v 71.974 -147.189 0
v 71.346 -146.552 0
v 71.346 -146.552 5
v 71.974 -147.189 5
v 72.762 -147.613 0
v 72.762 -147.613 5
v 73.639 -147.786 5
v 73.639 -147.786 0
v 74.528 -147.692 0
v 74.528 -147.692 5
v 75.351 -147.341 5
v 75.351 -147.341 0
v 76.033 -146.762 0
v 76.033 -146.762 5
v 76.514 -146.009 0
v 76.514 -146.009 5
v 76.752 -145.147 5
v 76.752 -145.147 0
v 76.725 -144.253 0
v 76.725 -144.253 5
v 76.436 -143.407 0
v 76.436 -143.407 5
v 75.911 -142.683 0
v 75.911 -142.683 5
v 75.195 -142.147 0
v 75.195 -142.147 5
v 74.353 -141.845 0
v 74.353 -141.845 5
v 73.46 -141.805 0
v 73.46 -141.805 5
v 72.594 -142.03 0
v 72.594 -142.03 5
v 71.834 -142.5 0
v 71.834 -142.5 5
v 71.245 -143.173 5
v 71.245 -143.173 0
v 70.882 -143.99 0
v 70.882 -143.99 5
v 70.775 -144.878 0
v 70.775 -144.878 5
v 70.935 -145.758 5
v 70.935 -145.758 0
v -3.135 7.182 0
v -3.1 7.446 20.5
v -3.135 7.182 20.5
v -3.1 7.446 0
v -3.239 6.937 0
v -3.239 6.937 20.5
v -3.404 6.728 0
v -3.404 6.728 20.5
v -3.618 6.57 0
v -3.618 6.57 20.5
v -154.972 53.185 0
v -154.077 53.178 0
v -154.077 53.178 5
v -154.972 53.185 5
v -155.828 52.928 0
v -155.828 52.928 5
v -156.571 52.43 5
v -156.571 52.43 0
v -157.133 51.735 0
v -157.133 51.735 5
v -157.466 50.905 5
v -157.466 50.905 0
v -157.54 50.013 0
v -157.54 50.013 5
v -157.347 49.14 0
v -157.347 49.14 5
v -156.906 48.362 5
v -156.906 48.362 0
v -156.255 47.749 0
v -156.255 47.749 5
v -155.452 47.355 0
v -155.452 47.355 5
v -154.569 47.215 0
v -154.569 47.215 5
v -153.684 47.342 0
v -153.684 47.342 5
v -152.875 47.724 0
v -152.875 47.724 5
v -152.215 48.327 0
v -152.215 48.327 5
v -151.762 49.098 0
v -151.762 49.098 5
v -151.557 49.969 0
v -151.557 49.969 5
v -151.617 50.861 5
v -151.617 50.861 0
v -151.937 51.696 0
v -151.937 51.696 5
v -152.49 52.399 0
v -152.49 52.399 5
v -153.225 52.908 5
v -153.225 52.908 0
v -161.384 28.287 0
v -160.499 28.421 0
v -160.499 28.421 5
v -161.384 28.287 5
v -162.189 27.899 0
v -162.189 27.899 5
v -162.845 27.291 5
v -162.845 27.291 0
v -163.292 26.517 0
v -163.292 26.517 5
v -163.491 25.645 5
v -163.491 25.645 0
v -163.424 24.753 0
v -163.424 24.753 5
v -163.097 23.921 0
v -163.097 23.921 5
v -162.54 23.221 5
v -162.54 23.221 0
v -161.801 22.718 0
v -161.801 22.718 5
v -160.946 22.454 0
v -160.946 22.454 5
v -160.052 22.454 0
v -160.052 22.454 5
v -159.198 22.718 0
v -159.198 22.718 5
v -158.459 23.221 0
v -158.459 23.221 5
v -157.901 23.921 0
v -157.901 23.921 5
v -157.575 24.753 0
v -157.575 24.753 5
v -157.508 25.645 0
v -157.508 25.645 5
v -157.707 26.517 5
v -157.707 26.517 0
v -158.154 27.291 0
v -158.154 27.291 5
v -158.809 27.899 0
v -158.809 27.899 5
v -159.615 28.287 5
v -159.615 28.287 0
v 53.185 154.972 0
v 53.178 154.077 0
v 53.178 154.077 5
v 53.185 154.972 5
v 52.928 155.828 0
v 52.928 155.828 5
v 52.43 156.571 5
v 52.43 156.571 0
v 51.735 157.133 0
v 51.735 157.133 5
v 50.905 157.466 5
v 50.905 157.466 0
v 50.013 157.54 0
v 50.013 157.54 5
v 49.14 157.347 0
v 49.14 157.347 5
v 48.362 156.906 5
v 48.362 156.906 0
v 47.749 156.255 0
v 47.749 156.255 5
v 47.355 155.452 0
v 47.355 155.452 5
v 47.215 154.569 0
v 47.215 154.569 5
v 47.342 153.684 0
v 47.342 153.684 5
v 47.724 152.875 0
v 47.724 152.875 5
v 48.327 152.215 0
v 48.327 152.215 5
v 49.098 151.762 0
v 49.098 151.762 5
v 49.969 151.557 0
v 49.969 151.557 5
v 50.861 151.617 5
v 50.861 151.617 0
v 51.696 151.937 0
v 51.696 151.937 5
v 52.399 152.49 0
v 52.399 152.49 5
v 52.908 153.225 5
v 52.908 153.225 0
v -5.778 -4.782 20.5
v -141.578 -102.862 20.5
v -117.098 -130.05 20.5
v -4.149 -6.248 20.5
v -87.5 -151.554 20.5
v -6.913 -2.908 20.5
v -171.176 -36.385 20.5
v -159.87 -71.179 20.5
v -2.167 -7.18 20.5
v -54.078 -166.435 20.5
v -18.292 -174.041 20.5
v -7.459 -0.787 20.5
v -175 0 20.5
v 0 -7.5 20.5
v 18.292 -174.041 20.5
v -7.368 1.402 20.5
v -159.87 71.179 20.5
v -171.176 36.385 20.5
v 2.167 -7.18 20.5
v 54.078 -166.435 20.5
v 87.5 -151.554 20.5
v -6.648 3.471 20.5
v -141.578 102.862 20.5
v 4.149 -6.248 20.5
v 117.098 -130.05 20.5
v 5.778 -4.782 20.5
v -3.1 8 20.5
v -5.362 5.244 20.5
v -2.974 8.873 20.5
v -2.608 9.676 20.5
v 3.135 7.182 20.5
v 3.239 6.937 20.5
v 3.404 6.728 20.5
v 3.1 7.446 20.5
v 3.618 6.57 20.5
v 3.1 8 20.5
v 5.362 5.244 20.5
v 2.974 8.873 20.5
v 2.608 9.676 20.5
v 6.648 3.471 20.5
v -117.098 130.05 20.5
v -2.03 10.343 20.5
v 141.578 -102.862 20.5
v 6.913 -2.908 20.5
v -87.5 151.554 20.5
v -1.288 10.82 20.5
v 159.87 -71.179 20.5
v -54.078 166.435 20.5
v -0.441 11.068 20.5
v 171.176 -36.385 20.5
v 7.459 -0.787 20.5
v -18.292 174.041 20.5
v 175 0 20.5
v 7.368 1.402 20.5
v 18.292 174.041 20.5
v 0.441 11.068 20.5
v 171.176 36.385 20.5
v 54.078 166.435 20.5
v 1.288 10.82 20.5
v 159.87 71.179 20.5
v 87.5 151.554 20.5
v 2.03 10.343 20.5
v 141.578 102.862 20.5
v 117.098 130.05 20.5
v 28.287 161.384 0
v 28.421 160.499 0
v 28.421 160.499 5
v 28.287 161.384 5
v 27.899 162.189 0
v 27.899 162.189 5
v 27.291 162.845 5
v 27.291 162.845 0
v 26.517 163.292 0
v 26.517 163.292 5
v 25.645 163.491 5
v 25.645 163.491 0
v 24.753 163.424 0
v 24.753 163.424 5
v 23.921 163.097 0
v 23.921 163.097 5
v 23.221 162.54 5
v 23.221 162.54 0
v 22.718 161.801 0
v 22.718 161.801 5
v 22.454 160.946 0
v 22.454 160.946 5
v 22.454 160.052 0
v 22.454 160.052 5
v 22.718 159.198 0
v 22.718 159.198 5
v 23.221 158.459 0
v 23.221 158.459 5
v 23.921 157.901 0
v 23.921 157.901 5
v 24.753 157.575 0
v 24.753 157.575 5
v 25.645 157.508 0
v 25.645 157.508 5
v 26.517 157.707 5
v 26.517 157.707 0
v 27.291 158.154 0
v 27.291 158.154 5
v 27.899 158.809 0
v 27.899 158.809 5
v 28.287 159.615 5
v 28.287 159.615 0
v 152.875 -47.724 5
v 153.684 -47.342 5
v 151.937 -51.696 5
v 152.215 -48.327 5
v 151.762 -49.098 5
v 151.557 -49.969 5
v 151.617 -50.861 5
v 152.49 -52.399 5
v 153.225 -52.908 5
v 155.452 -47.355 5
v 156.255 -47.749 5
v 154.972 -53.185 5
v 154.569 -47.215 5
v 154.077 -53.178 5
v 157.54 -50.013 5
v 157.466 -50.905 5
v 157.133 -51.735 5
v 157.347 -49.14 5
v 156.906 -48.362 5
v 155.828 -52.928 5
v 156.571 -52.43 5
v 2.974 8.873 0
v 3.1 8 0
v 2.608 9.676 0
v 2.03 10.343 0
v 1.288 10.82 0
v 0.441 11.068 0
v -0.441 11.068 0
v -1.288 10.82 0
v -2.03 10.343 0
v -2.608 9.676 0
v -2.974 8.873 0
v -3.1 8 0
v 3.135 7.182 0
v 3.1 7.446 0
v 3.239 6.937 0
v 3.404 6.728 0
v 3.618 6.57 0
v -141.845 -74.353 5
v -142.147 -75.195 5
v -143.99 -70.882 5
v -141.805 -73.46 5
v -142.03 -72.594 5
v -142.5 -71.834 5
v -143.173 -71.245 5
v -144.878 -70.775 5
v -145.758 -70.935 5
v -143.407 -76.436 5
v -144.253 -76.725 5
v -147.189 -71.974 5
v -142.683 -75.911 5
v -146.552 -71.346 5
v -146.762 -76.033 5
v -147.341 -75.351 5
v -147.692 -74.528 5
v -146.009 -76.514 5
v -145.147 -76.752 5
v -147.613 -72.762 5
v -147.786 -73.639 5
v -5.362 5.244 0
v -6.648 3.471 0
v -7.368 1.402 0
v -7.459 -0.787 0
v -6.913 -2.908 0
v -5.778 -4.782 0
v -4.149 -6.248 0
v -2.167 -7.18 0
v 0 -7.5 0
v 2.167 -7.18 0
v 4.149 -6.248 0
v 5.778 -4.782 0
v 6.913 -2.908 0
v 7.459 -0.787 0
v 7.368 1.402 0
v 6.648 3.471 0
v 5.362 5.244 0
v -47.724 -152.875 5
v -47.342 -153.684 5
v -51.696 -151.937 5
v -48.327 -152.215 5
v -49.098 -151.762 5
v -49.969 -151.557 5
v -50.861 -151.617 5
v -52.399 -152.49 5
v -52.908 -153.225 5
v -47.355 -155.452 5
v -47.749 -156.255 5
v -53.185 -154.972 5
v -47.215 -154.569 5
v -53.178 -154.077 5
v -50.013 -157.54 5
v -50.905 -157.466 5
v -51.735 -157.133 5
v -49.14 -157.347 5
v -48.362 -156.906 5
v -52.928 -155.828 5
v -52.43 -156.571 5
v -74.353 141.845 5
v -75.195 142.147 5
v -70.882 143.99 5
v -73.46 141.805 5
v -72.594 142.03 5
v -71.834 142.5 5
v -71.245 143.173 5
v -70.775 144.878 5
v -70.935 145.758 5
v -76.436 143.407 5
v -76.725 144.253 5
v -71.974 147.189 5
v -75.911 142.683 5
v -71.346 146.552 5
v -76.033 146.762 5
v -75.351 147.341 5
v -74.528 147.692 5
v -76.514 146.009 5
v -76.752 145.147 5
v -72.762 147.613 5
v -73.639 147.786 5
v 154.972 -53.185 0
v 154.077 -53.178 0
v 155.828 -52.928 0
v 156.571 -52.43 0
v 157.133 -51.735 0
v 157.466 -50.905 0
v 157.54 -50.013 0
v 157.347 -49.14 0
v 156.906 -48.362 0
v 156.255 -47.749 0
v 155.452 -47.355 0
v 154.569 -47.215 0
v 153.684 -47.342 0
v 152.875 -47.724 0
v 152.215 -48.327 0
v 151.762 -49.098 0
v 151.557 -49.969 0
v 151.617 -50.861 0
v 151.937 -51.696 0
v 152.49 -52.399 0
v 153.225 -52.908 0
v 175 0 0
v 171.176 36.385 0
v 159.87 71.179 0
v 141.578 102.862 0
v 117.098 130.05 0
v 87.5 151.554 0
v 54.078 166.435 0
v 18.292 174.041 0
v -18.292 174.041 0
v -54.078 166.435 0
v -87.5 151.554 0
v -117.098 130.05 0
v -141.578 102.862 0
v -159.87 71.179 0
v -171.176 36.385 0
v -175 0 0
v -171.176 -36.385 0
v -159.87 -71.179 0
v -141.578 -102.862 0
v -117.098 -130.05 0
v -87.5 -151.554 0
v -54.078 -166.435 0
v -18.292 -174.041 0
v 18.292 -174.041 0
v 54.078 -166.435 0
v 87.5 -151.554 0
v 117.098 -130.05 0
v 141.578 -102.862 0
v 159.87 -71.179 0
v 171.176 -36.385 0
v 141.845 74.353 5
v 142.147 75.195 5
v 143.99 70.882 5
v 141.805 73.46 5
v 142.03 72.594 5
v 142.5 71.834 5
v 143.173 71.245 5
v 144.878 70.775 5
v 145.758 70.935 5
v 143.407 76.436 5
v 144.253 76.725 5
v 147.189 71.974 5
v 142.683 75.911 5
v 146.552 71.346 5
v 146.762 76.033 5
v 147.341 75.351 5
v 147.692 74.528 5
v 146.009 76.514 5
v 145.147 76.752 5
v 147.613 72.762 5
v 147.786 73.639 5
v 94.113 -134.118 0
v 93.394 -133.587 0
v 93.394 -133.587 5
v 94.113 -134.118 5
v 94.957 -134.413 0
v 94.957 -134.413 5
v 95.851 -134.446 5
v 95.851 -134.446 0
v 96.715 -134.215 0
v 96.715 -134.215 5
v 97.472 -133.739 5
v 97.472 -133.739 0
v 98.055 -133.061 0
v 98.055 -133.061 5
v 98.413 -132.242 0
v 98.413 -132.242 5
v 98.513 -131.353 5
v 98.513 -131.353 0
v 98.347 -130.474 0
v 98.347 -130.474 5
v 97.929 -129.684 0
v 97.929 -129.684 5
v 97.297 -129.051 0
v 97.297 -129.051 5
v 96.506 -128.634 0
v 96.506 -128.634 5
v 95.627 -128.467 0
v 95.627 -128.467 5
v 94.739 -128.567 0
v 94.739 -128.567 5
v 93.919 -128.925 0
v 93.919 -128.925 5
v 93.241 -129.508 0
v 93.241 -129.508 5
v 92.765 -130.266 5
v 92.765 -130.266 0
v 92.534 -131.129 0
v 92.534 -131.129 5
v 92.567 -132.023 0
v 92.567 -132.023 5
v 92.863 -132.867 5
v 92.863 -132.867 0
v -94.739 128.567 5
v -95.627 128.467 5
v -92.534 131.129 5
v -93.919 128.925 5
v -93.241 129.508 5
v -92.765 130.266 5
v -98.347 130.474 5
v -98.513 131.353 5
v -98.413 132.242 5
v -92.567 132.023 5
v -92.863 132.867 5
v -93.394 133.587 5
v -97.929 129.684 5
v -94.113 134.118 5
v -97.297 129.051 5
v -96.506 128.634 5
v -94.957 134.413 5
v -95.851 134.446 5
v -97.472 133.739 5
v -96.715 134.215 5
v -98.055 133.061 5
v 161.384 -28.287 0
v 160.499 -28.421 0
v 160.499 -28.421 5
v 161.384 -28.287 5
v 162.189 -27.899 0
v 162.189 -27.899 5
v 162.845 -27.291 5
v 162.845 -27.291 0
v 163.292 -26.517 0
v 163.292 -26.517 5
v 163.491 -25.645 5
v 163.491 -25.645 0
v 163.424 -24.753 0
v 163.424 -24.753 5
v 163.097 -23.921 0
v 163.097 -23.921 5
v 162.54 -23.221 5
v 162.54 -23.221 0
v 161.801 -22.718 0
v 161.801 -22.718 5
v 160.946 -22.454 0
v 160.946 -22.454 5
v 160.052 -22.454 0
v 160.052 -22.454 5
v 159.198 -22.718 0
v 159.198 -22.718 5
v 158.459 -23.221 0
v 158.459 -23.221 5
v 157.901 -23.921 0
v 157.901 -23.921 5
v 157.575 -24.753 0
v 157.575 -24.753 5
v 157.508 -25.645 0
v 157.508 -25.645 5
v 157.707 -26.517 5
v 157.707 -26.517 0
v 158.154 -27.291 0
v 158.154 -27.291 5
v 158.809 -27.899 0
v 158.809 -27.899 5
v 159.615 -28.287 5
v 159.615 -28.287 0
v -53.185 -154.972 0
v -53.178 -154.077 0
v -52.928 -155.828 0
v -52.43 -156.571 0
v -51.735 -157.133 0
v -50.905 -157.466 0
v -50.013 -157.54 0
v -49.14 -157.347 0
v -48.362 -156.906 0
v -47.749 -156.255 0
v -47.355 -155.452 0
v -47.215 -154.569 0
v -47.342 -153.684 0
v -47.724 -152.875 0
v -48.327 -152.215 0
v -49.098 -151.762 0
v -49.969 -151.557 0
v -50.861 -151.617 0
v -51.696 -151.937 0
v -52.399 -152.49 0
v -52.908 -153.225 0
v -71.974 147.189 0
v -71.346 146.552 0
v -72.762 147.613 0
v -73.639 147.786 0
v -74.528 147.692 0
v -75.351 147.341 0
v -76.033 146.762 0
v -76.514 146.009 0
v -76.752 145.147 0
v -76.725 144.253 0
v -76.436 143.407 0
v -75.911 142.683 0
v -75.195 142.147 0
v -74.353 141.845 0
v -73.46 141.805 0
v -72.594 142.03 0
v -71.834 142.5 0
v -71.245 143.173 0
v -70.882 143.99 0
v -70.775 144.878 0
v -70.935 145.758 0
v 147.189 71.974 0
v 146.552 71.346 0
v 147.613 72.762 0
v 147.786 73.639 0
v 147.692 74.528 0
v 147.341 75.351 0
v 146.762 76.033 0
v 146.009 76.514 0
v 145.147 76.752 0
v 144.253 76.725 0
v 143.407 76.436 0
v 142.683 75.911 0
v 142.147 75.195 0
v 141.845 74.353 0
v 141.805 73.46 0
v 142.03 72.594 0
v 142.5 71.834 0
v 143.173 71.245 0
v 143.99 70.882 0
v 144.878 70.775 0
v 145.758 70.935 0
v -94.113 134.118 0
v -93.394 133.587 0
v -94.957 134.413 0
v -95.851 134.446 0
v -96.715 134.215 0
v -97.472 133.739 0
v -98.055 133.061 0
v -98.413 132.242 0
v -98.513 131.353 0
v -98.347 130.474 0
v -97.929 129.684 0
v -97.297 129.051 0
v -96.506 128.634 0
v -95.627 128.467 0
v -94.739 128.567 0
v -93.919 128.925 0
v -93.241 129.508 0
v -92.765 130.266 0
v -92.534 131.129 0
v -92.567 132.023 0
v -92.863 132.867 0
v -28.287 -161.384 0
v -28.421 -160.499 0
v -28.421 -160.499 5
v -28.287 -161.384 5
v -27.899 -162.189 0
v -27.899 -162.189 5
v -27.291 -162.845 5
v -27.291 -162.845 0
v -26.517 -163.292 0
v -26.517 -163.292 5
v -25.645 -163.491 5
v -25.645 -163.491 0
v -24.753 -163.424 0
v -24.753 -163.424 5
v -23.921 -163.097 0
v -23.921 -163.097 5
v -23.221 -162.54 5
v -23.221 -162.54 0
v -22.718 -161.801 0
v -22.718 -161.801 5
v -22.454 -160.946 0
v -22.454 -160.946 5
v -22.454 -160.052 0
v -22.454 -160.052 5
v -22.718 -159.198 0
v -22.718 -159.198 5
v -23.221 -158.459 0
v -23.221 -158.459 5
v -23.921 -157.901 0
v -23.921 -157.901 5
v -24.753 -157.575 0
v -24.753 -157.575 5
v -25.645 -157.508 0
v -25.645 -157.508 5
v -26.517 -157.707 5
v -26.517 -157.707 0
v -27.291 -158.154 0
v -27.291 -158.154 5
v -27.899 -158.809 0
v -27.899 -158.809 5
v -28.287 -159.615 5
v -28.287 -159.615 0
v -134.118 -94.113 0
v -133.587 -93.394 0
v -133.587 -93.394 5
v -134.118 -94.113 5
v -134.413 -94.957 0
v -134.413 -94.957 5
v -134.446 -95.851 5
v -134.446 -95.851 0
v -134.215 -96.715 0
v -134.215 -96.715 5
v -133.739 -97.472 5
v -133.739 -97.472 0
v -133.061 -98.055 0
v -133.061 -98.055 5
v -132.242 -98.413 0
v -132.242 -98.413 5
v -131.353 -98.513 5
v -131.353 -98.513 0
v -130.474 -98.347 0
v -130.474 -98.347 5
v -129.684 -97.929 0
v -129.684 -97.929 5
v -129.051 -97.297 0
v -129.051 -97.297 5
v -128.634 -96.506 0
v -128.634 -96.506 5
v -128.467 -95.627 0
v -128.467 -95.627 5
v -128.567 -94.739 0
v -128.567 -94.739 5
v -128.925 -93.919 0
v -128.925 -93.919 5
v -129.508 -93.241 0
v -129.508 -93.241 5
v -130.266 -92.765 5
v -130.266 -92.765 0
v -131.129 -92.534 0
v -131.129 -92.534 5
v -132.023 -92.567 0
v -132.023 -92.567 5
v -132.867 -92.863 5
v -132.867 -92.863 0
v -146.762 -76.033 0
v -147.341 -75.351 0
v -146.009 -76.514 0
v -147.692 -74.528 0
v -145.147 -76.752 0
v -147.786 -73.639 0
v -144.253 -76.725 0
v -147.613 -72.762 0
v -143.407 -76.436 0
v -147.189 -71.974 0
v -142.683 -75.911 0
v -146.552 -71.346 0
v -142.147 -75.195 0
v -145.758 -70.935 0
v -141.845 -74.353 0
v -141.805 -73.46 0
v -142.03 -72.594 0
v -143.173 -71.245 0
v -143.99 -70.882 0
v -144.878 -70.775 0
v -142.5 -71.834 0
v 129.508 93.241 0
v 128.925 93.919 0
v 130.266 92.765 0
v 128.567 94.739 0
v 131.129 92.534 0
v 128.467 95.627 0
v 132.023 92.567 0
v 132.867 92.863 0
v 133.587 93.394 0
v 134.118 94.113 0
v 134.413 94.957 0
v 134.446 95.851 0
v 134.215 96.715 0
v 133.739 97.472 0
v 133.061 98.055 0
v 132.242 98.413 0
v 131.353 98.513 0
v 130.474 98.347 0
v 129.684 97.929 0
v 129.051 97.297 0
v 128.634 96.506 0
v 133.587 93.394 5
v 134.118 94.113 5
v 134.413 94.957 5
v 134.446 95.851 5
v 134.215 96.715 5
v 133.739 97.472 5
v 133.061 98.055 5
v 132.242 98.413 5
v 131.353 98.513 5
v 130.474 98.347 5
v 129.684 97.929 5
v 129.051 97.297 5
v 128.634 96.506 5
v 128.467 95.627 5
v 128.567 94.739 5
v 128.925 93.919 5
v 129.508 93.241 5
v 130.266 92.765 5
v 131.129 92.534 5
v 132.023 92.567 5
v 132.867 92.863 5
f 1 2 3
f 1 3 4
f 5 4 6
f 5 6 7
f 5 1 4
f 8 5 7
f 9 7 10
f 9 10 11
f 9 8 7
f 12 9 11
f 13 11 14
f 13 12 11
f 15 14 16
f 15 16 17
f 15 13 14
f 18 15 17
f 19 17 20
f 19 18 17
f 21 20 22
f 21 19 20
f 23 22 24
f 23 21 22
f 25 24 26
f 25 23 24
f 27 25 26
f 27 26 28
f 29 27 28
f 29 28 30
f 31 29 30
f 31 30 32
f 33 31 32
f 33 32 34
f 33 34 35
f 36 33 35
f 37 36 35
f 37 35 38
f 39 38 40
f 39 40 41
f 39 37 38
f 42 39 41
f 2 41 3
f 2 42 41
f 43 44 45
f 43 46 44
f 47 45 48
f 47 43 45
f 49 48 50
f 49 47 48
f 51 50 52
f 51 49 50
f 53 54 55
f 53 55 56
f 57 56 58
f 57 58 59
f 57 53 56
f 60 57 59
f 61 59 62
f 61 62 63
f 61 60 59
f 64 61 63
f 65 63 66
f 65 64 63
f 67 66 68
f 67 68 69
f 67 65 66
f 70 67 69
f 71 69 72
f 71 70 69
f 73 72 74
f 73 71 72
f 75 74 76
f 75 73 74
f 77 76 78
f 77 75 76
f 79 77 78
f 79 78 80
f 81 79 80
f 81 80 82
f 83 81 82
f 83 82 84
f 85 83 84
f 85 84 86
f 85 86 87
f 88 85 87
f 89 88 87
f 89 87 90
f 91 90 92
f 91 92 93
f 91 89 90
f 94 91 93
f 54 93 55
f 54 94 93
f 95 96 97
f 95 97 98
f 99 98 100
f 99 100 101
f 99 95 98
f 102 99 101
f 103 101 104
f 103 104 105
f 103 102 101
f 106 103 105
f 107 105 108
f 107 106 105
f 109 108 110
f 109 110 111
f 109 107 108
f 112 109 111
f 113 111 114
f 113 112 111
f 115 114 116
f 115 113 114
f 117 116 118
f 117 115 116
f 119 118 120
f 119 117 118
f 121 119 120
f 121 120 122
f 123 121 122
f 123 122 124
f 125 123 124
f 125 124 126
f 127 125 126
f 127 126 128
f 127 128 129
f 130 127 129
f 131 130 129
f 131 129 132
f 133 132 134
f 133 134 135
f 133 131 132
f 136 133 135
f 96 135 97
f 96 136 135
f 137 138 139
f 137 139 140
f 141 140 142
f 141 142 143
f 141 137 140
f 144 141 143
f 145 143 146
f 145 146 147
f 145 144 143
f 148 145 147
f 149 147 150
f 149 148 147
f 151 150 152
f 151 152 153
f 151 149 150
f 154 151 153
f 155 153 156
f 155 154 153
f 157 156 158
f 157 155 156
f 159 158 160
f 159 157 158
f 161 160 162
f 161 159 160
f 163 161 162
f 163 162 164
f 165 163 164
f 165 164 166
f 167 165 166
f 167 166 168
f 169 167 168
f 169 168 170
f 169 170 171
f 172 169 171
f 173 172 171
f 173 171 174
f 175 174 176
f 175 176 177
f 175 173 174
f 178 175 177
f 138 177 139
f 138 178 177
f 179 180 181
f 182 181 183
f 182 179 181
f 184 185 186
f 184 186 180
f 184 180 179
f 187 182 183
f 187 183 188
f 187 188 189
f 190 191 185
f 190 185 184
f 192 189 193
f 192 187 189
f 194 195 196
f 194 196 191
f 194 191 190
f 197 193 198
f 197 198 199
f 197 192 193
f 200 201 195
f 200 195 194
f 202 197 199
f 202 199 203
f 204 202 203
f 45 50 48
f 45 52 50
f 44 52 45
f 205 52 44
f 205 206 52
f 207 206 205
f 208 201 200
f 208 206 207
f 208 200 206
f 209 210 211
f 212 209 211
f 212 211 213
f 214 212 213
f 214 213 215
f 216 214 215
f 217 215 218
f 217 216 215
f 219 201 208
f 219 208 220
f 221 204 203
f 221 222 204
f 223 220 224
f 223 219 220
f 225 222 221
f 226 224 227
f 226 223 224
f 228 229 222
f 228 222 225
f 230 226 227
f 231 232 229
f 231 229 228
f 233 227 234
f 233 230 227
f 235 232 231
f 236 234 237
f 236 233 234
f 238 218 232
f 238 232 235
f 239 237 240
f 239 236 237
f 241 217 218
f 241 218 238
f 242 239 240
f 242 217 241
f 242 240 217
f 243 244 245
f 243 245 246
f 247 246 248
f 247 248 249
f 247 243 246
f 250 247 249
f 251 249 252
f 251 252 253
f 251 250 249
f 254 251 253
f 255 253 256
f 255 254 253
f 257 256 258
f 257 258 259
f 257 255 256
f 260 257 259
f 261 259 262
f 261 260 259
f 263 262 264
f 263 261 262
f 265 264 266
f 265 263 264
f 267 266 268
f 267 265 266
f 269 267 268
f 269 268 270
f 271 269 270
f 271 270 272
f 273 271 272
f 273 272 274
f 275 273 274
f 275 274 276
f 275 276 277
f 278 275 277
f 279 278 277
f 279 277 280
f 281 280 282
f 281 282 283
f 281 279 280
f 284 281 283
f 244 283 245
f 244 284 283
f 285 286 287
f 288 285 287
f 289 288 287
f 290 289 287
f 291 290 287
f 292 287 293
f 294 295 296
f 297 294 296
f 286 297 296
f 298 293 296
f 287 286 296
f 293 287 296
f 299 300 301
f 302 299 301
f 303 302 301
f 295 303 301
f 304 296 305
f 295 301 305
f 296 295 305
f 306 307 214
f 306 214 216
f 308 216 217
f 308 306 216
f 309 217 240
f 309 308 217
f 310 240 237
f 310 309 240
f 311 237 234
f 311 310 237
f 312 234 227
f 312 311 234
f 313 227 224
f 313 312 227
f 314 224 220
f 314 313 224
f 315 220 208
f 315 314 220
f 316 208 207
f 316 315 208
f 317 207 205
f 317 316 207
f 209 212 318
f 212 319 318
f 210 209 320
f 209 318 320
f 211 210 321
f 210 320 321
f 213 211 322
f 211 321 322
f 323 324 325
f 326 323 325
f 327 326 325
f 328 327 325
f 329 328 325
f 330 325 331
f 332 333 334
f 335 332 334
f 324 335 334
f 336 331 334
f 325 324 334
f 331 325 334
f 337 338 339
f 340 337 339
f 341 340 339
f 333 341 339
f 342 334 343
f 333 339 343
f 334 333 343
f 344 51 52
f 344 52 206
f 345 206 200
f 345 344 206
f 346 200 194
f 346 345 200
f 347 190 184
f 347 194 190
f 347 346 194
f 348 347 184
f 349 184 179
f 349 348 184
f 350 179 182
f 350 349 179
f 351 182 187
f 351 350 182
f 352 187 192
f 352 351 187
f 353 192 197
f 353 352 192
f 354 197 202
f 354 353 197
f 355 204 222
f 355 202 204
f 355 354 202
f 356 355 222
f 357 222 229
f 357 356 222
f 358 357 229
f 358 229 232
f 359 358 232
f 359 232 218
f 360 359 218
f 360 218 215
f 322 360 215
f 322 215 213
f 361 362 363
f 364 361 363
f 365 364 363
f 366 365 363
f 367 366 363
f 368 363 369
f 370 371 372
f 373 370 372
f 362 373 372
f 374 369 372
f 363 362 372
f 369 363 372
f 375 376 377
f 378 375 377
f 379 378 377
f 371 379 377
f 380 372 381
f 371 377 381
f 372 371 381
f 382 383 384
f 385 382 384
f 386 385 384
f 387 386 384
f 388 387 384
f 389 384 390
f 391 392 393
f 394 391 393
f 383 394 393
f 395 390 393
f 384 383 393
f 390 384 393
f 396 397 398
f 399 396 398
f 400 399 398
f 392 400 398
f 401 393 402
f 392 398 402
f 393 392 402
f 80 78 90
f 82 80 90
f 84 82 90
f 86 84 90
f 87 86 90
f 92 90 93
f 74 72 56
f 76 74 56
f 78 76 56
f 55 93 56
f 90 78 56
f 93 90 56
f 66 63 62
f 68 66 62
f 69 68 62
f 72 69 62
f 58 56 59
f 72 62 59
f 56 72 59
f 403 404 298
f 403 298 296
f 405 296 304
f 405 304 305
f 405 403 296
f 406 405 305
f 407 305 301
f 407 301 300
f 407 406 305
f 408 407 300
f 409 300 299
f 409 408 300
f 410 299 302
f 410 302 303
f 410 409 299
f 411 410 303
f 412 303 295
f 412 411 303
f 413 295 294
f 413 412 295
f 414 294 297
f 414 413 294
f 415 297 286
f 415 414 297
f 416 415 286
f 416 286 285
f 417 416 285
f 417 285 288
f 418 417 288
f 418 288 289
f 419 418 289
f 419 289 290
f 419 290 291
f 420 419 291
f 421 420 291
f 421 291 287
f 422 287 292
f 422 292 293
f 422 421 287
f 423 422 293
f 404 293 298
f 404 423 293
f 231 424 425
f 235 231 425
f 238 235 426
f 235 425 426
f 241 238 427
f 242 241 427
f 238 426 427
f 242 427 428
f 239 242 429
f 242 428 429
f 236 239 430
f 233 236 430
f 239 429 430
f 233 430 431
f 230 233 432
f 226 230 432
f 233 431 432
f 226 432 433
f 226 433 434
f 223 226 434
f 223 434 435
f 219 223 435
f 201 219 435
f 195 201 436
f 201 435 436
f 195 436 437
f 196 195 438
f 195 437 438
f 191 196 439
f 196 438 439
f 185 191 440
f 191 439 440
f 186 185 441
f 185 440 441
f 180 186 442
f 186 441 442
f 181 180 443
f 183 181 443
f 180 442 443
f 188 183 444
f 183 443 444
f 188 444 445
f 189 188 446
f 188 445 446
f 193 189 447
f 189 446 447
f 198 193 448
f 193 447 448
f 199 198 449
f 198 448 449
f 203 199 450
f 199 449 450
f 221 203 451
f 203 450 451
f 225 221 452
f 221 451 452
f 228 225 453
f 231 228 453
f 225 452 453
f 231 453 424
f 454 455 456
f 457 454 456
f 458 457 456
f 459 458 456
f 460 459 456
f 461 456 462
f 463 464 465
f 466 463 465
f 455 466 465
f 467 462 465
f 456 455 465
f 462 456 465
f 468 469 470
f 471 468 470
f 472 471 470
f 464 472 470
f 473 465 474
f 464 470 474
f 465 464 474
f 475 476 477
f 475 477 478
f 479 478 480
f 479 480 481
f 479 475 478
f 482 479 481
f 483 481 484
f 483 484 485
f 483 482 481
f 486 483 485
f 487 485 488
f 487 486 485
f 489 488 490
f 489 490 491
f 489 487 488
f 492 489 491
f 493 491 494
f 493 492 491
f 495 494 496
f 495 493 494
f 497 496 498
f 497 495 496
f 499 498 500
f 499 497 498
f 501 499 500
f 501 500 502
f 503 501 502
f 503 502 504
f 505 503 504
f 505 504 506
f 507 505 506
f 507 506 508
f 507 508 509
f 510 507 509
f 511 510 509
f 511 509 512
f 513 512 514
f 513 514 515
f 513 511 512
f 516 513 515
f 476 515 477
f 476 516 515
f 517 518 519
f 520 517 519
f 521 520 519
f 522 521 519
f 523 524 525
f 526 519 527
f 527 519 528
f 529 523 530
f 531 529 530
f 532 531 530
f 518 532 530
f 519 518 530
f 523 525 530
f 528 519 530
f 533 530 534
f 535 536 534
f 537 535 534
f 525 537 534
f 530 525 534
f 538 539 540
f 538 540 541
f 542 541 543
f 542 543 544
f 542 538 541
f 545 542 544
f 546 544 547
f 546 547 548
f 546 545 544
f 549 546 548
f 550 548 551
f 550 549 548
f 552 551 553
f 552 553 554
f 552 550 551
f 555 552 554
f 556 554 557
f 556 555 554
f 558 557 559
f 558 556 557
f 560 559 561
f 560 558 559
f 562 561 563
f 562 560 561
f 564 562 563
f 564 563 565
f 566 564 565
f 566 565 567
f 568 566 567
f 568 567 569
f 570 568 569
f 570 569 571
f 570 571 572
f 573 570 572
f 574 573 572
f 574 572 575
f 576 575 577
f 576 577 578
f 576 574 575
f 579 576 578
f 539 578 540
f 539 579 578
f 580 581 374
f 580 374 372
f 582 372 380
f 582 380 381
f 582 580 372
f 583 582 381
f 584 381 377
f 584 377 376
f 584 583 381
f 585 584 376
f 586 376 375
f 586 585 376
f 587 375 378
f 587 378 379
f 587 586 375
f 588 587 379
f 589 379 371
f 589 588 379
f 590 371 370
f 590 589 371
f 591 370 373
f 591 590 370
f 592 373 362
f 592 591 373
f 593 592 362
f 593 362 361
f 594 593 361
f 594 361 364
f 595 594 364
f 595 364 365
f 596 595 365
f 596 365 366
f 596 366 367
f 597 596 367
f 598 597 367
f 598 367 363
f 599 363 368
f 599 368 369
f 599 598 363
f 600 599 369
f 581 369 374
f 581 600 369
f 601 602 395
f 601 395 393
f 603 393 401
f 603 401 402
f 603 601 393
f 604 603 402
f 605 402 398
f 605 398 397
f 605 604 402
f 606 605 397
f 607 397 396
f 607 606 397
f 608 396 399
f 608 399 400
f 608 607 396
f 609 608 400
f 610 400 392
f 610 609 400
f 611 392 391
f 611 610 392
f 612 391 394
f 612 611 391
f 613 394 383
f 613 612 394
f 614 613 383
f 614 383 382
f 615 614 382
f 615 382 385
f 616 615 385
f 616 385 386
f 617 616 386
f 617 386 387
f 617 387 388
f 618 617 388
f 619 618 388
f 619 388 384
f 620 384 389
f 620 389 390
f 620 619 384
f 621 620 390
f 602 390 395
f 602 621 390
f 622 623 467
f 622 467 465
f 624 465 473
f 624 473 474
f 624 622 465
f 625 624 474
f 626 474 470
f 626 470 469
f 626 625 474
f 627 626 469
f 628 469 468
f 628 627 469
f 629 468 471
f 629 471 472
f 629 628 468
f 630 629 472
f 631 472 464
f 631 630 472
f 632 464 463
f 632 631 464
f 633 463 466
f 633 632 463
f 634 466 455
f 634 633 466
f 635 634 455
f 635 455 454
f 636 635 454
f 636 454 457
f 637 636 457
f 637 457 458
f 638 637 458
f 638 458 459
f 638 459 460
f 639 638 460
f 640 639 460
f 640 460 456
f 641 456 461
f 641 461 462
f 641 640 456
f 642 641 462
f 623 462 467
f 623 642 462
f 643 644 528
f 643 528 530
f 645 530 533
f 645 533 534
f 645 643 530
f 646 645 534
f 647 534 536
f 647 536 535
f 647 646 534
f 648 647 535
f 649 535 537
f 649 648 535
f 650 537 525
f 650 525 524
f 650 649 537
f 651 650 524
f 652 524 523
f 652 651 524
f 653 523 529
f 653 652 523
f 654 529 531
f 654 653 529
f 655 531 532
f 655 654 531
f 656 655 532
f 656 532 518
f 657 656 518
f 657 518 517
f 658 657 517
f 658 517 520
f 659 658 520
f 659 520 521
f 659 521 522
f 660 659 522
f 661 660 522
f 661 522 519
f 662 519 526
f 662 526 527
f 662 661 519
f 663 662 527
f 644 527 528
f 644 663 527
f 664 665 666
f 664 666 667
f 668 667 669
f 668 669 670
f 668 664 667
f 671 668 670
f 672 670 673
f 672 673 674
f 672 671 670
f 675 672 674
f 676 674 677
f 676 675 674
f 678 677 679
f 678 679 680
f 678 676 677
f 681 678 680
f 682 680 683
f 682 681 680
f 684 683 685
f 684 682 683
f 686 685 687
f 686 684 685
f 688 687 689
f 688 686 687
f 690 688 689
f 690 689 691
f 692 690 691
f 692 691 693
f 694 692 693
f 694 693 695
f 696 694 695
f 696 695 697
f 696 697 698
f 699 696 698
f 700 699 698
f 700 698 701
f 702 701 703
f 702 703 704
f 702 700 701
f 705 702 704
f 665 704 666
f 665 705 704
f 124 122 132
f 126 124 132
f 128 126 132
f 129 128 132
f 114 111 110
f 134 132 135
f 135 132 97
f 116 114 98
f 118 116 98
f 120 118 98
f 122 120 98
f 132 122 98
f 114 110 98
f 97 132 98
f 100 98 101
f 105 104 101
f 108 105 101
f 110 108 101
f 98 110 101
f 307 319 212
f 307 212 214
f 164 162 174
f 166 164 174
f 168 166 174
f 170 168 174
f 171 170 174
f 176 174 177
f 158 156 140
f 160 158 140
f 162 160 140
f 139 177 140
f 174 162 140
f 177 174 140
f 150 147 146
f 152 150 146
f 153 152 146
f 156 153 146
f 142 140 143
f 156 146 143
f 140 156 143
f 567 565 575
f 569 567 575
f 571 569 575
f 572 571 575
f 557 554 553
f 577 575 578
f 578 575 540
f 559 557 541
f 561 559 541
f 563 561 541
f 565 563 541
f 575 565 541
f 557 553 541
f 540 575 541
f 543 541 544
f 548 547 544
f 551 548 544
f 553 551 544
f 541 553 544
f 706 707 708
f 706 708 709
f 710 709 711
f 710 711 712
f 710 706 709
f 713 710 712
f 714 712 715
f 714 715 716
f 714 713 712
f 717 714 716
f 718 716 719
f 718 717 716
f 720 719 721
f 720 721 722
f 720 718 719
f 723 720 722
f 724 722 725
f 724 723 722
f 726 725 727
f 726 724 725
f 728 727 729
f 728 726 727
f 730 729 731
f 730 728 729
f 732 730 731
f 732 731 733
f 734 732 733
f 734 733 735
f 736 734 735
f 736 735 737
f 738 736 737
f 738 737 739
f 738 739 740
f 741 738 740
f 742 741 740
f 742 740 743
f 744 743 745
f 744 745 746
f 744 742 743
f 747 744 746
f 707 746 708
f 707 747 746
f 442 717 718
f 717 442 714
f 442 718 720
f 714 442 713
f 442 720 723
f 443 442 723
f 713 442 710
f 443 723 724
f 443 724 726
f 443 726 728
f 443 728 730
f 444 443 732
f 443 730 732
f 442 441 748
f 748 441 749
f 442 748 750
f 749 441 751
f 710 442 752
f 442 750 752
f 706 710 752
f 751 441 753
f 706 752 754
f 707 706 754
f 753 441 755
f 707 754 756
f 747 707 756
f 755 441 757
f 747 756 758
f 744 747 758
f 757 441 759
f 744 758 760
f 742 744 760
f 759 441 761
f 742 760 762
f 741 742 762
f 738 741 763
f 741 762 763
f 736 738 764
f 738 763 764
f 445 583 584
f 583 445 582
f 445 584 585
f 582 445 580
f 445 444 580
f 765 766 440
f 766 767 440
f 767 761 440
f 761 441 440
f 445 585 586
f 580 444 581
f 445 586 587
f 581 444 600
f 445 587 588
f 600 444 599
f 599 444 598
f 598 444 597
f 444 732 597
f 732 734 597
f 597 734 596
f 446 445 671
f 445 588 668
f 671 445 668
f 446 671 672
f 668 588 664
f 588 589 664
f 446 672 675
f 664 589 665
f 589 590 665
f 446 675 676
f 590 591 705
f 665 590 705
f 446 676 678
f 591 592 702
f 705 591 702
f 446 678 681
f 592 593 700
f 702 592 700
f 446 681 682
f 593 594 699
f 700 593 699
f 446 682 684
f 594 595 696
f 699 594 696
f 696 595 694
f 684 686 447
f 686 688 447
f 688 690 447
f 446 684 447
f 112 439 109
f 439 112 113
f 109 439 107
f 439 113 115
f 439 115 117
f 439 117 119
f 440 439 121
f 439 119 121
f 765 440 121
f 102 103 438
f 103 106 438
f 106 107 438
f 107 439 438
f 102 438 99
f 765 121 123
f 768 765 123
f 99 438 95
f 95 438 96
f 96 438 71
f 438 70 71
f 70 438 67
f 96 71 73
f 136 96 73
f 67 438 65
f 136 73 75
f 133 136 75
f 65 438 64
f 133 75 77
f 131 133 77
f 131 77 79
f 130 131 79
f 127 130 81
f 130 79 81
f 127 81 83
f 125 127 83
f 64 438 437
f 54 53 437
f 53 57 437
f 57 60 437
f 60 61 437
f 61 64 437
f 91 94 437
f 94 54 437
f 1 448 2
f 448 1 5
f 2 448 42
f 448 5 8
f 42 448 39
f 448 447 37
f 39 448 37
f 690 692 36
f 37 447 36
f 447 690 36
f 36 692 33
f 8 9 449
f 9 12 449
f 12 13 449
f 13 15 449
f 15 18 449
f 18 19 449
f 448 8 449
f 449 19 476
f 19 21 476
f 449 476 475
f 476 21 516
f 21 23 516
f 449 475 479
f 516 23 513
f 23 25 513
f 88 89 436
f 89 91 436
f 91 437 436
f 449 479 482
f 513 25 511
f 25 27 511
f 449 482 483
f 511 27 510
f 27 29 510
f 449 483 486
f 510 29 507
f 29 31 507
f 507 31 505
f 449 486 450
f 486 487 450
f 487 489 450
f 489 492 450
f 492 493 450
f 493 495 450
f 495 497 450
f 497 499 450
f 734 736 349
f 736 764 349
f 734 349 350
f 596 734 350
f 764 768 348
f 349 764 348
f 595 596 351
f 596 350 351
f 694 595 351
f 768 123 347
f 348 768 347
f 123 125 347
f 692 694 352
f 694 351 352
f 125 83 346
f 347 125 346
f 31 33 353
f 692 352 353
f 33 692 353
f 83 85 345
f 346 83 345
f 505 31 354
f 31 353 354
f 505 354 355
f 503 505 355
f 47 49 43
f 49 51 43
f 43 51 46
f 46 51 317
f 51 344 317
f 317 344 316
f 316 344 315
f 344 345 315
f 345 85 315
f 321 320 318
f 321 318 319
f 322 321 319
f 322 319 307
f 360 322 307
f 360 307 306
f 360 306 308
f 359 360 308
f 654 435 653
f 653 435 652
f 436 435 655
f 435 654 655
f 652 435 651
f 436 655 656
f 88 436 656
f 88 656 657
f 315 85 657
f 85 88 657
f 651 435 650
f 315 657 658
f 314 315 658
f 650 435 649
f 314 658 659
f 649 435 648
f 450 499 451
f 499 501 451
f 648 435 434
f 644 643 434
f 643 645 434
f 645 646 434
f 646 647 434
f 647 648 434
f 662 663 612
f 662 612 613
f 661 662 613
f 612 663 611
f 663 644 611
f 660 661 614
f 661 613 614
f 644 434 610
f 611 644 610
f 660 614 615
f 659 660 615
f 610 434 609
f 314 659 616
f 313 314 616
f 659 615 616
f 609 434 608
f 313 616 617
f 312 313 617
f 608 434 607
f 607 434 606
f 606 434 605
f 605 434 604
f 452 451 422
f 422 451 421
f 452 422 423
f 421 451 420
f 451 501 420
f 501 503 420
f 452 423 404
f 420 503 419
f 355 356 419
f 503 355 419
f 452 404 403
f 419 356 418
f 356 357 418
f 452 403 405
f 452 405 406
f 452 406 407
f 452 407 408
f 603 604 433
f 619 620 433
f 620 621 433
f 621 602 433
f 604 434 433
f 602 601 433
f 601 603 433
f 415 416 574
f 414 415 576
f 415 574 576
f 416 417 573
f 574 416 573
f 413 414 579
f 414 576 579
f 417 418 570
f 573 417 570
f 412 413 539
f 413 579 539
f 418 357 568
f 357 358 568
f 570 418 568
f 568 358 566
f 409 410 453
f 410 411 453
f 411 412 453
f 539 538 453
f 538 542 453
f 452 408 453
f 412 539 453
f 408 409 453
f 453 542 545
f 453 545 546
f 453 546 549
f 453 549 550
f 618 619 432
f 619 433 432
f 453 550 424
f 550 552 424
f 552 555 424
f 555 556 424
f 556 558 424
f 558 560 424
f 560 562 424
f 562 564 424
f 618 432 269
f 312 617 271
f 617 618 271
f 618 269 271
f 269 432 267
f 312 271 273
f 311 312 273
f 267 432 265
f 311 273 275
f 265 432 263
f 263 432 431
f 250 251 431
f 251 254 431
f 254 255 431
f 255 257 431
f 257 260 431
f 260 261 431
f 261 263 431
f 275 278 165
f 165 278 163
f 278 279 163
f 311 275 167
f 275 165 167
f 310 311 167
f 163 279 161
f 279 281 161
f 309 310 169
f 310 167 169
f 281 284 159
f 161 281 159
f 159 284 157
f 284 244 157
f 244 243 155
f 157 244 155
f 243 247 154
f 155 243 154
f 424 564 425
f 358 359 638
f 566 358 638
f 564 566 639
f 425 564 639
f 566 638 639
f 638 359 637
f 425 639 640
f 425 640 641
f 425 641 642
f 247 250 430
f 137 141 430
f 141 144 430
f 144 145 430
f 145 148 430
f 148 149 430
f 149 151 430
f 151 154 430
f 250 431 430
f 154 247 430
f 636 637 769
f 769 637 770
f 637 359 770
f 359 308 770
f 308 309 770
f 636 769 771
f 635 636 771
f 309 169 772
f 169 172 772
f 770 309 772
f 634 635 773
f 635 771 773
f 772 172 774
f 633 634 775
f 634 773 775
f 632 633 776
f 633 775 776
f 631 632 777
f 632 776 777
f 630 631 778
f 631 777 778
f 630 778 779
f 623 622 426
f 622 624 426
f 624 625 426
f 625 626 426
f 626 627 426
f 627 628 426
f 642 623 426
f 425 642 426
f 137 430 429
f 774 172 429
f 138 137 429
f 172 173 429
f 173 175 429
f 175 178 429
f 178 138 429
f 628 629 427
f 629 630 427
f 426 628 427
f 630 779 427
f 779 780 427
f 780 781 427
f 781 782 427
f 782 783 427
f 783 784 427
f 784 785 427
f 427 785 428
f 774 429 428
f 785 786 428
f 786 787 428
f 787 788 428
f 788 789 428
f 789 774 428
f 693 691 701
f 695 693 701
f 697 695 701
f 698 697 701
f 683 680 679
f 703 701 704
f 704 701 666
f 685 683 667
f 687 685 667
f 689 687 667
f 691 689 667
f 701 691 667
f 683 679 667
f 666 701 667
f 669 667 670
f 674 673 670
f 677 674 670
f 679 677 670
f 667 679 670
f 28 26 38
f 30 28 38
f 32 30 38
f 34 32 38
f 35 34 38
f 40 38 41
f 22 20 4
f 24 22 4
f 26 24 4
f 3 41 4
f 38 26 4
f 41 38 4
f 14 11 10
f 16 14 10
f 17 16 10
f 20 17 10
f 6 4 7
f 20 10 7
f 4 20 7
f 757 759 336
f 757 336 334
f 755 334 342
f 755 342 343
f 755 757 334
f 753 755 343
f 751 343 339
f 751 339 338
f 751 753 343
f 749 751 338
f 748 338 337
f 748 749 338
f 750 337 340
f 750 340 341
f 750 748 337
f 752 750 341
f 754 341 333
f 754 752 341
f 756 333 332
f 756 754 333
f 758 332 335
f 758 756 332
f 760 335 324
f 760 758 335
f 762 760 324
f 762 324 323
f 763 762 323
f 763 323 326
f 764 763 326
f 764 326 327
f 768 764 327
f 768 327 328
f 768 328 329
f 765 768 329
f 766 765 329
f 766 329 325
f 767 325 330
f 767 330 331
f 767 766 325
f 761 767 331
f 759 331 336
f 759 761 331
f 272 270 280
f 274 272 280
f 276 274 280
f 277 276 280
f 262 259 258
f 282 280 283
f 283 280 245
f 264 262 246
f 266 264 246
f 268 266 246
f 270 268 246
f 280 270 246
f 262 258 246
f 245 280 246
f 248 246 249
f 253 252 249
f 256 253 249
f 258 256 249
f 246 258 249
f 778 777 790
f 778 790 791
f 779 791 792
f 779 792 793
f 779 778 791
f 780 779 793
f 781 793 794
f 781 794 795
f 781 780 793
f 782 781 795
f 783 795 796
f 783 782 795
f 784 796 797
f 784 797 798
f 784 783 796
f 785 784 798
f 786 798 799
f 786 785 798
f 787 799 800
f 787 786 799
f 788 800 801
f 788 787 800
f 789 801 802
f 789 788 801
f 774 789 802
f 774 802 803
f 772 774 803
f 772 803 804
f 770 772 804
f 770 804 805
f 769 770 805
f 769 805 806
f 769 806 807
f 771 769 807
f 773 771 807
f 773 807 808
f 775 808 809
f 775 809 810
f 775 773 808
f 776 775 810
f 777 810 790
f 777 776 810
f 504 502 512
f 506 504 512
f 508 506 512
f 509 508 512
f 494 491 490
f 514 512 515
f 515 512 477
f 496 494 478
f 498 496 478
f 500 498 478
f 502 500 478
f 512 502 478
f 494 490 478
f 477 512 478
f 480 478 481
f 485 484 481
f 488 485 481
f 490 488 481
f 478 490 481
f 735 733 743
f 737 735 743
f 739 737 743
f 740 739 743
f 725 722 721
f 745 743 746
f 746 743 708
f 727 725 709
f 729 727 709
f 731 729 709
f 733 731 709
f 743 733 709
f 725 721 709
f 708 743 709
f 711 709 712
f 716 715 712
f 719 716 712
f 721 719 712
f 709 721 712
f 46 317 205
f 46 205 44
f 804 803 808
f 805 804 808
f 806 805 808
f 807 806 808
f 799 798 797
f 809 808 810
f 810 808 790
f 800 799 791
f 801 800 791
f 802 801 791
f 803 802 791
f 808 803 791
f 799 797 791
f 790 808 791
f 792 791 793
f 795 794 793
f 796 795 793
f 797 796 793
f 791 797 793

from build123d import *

# Parameters (mm, degrees)
SKETCH_R                    = 175
SKETCH_R_2                  = 7.5
PAD_DEPTH                   = 20.5
SKETCH009_R                 = 3
POCKET_DEPTH                = 5
SKETCH009_POLARPATTERN_2_R  = 3
POCKET_POLARPATTERN_2_DEPTH = 5
POLARPATTERN001_COUNT       = 8
POCKET001_DEPTH             = 20.501
FILLET001_R                 = 1


with BuildPart() as part:
    # Sketch → Pad (new body)
    with BuildSketch(Plane.XY):
        Circle(SKETCH_R)
        Circle(SKETCH_R_2, mode=Mode.SUBTRACT)
    extrude(amount=PAD_DEPTH)

    # Sketch009 → Pocket (cut)
    with BuildSketch(Plane.XY):
        with Locations((25.420601, 160.499355)):
            Circle(SKETCH009_R)
    pocket = extrude(amount=POCKET_DEPTH, mode=Mode.SUBTRACT)

    # Sketch009 PolarPattern 2 → Pocket PolarPattern 2 (cut)
    with BuildSketch(Plane(origin=(0, 0, 0), x_dir=(0.987688, -0.156434, 0), z_dir=(0, 0, 1))):
        with Locations((25.420601, 160.499355)):
            Circle(SKETCH009_POLARPATTERN_2_R)
    pocket_polarpattern_2 = extrude(amount=POCKET_POLARPATTERN_2_DEPTH, mode=Mode.SUBTRACT)

    # PolarPattern001: Pocket, Pocket PolarPattern 2 ×8 about axis
    polarpattern001_axis = Axis((0, 0, 0), (0, 0, 1))
    for i in range(1, POLARPATTERN001_COUNT):
        add(pocket.rotate(polarpattern001_axis, i * 360 / POLARPATTERN001_COUNT), mode=Mode.SUBTRACT)
        add(pocket_polarpattern_2.rotate(polarpattern001_axis, i * 360 / POLARPATTERN001_COUNT), mode=Mode.SUBTRACT)

    # Sketch010 → Pocket001 (cut, through all)
    with BuildSketch(Plane.XY):
        with BuildLine():
            ThreePointArc((-3.1, 0), (0, -3.1), (3.1, 0))
            Line((3.1, 0), (3.1, 8))
            ThreePointArc((3.1, 8), (0, 11.1), (-3.1, 8))
            Line((-3.1, 8), (-3.1, 0))
        make_face()
    extrude(amount=POCKET001_DEPTH, mode=Mode.SUBTRACT)

    # Fillet001
    fillet001_edges = [part.edges().sort_by_distance(p)[0] for p in [
        (-3.1, 6.829348, 10.25),
        (3.1, 6.829348, 10.25),
    ]]
    fillet(fillet001_edges, radius=FILLET001_R)


solid = part.part
